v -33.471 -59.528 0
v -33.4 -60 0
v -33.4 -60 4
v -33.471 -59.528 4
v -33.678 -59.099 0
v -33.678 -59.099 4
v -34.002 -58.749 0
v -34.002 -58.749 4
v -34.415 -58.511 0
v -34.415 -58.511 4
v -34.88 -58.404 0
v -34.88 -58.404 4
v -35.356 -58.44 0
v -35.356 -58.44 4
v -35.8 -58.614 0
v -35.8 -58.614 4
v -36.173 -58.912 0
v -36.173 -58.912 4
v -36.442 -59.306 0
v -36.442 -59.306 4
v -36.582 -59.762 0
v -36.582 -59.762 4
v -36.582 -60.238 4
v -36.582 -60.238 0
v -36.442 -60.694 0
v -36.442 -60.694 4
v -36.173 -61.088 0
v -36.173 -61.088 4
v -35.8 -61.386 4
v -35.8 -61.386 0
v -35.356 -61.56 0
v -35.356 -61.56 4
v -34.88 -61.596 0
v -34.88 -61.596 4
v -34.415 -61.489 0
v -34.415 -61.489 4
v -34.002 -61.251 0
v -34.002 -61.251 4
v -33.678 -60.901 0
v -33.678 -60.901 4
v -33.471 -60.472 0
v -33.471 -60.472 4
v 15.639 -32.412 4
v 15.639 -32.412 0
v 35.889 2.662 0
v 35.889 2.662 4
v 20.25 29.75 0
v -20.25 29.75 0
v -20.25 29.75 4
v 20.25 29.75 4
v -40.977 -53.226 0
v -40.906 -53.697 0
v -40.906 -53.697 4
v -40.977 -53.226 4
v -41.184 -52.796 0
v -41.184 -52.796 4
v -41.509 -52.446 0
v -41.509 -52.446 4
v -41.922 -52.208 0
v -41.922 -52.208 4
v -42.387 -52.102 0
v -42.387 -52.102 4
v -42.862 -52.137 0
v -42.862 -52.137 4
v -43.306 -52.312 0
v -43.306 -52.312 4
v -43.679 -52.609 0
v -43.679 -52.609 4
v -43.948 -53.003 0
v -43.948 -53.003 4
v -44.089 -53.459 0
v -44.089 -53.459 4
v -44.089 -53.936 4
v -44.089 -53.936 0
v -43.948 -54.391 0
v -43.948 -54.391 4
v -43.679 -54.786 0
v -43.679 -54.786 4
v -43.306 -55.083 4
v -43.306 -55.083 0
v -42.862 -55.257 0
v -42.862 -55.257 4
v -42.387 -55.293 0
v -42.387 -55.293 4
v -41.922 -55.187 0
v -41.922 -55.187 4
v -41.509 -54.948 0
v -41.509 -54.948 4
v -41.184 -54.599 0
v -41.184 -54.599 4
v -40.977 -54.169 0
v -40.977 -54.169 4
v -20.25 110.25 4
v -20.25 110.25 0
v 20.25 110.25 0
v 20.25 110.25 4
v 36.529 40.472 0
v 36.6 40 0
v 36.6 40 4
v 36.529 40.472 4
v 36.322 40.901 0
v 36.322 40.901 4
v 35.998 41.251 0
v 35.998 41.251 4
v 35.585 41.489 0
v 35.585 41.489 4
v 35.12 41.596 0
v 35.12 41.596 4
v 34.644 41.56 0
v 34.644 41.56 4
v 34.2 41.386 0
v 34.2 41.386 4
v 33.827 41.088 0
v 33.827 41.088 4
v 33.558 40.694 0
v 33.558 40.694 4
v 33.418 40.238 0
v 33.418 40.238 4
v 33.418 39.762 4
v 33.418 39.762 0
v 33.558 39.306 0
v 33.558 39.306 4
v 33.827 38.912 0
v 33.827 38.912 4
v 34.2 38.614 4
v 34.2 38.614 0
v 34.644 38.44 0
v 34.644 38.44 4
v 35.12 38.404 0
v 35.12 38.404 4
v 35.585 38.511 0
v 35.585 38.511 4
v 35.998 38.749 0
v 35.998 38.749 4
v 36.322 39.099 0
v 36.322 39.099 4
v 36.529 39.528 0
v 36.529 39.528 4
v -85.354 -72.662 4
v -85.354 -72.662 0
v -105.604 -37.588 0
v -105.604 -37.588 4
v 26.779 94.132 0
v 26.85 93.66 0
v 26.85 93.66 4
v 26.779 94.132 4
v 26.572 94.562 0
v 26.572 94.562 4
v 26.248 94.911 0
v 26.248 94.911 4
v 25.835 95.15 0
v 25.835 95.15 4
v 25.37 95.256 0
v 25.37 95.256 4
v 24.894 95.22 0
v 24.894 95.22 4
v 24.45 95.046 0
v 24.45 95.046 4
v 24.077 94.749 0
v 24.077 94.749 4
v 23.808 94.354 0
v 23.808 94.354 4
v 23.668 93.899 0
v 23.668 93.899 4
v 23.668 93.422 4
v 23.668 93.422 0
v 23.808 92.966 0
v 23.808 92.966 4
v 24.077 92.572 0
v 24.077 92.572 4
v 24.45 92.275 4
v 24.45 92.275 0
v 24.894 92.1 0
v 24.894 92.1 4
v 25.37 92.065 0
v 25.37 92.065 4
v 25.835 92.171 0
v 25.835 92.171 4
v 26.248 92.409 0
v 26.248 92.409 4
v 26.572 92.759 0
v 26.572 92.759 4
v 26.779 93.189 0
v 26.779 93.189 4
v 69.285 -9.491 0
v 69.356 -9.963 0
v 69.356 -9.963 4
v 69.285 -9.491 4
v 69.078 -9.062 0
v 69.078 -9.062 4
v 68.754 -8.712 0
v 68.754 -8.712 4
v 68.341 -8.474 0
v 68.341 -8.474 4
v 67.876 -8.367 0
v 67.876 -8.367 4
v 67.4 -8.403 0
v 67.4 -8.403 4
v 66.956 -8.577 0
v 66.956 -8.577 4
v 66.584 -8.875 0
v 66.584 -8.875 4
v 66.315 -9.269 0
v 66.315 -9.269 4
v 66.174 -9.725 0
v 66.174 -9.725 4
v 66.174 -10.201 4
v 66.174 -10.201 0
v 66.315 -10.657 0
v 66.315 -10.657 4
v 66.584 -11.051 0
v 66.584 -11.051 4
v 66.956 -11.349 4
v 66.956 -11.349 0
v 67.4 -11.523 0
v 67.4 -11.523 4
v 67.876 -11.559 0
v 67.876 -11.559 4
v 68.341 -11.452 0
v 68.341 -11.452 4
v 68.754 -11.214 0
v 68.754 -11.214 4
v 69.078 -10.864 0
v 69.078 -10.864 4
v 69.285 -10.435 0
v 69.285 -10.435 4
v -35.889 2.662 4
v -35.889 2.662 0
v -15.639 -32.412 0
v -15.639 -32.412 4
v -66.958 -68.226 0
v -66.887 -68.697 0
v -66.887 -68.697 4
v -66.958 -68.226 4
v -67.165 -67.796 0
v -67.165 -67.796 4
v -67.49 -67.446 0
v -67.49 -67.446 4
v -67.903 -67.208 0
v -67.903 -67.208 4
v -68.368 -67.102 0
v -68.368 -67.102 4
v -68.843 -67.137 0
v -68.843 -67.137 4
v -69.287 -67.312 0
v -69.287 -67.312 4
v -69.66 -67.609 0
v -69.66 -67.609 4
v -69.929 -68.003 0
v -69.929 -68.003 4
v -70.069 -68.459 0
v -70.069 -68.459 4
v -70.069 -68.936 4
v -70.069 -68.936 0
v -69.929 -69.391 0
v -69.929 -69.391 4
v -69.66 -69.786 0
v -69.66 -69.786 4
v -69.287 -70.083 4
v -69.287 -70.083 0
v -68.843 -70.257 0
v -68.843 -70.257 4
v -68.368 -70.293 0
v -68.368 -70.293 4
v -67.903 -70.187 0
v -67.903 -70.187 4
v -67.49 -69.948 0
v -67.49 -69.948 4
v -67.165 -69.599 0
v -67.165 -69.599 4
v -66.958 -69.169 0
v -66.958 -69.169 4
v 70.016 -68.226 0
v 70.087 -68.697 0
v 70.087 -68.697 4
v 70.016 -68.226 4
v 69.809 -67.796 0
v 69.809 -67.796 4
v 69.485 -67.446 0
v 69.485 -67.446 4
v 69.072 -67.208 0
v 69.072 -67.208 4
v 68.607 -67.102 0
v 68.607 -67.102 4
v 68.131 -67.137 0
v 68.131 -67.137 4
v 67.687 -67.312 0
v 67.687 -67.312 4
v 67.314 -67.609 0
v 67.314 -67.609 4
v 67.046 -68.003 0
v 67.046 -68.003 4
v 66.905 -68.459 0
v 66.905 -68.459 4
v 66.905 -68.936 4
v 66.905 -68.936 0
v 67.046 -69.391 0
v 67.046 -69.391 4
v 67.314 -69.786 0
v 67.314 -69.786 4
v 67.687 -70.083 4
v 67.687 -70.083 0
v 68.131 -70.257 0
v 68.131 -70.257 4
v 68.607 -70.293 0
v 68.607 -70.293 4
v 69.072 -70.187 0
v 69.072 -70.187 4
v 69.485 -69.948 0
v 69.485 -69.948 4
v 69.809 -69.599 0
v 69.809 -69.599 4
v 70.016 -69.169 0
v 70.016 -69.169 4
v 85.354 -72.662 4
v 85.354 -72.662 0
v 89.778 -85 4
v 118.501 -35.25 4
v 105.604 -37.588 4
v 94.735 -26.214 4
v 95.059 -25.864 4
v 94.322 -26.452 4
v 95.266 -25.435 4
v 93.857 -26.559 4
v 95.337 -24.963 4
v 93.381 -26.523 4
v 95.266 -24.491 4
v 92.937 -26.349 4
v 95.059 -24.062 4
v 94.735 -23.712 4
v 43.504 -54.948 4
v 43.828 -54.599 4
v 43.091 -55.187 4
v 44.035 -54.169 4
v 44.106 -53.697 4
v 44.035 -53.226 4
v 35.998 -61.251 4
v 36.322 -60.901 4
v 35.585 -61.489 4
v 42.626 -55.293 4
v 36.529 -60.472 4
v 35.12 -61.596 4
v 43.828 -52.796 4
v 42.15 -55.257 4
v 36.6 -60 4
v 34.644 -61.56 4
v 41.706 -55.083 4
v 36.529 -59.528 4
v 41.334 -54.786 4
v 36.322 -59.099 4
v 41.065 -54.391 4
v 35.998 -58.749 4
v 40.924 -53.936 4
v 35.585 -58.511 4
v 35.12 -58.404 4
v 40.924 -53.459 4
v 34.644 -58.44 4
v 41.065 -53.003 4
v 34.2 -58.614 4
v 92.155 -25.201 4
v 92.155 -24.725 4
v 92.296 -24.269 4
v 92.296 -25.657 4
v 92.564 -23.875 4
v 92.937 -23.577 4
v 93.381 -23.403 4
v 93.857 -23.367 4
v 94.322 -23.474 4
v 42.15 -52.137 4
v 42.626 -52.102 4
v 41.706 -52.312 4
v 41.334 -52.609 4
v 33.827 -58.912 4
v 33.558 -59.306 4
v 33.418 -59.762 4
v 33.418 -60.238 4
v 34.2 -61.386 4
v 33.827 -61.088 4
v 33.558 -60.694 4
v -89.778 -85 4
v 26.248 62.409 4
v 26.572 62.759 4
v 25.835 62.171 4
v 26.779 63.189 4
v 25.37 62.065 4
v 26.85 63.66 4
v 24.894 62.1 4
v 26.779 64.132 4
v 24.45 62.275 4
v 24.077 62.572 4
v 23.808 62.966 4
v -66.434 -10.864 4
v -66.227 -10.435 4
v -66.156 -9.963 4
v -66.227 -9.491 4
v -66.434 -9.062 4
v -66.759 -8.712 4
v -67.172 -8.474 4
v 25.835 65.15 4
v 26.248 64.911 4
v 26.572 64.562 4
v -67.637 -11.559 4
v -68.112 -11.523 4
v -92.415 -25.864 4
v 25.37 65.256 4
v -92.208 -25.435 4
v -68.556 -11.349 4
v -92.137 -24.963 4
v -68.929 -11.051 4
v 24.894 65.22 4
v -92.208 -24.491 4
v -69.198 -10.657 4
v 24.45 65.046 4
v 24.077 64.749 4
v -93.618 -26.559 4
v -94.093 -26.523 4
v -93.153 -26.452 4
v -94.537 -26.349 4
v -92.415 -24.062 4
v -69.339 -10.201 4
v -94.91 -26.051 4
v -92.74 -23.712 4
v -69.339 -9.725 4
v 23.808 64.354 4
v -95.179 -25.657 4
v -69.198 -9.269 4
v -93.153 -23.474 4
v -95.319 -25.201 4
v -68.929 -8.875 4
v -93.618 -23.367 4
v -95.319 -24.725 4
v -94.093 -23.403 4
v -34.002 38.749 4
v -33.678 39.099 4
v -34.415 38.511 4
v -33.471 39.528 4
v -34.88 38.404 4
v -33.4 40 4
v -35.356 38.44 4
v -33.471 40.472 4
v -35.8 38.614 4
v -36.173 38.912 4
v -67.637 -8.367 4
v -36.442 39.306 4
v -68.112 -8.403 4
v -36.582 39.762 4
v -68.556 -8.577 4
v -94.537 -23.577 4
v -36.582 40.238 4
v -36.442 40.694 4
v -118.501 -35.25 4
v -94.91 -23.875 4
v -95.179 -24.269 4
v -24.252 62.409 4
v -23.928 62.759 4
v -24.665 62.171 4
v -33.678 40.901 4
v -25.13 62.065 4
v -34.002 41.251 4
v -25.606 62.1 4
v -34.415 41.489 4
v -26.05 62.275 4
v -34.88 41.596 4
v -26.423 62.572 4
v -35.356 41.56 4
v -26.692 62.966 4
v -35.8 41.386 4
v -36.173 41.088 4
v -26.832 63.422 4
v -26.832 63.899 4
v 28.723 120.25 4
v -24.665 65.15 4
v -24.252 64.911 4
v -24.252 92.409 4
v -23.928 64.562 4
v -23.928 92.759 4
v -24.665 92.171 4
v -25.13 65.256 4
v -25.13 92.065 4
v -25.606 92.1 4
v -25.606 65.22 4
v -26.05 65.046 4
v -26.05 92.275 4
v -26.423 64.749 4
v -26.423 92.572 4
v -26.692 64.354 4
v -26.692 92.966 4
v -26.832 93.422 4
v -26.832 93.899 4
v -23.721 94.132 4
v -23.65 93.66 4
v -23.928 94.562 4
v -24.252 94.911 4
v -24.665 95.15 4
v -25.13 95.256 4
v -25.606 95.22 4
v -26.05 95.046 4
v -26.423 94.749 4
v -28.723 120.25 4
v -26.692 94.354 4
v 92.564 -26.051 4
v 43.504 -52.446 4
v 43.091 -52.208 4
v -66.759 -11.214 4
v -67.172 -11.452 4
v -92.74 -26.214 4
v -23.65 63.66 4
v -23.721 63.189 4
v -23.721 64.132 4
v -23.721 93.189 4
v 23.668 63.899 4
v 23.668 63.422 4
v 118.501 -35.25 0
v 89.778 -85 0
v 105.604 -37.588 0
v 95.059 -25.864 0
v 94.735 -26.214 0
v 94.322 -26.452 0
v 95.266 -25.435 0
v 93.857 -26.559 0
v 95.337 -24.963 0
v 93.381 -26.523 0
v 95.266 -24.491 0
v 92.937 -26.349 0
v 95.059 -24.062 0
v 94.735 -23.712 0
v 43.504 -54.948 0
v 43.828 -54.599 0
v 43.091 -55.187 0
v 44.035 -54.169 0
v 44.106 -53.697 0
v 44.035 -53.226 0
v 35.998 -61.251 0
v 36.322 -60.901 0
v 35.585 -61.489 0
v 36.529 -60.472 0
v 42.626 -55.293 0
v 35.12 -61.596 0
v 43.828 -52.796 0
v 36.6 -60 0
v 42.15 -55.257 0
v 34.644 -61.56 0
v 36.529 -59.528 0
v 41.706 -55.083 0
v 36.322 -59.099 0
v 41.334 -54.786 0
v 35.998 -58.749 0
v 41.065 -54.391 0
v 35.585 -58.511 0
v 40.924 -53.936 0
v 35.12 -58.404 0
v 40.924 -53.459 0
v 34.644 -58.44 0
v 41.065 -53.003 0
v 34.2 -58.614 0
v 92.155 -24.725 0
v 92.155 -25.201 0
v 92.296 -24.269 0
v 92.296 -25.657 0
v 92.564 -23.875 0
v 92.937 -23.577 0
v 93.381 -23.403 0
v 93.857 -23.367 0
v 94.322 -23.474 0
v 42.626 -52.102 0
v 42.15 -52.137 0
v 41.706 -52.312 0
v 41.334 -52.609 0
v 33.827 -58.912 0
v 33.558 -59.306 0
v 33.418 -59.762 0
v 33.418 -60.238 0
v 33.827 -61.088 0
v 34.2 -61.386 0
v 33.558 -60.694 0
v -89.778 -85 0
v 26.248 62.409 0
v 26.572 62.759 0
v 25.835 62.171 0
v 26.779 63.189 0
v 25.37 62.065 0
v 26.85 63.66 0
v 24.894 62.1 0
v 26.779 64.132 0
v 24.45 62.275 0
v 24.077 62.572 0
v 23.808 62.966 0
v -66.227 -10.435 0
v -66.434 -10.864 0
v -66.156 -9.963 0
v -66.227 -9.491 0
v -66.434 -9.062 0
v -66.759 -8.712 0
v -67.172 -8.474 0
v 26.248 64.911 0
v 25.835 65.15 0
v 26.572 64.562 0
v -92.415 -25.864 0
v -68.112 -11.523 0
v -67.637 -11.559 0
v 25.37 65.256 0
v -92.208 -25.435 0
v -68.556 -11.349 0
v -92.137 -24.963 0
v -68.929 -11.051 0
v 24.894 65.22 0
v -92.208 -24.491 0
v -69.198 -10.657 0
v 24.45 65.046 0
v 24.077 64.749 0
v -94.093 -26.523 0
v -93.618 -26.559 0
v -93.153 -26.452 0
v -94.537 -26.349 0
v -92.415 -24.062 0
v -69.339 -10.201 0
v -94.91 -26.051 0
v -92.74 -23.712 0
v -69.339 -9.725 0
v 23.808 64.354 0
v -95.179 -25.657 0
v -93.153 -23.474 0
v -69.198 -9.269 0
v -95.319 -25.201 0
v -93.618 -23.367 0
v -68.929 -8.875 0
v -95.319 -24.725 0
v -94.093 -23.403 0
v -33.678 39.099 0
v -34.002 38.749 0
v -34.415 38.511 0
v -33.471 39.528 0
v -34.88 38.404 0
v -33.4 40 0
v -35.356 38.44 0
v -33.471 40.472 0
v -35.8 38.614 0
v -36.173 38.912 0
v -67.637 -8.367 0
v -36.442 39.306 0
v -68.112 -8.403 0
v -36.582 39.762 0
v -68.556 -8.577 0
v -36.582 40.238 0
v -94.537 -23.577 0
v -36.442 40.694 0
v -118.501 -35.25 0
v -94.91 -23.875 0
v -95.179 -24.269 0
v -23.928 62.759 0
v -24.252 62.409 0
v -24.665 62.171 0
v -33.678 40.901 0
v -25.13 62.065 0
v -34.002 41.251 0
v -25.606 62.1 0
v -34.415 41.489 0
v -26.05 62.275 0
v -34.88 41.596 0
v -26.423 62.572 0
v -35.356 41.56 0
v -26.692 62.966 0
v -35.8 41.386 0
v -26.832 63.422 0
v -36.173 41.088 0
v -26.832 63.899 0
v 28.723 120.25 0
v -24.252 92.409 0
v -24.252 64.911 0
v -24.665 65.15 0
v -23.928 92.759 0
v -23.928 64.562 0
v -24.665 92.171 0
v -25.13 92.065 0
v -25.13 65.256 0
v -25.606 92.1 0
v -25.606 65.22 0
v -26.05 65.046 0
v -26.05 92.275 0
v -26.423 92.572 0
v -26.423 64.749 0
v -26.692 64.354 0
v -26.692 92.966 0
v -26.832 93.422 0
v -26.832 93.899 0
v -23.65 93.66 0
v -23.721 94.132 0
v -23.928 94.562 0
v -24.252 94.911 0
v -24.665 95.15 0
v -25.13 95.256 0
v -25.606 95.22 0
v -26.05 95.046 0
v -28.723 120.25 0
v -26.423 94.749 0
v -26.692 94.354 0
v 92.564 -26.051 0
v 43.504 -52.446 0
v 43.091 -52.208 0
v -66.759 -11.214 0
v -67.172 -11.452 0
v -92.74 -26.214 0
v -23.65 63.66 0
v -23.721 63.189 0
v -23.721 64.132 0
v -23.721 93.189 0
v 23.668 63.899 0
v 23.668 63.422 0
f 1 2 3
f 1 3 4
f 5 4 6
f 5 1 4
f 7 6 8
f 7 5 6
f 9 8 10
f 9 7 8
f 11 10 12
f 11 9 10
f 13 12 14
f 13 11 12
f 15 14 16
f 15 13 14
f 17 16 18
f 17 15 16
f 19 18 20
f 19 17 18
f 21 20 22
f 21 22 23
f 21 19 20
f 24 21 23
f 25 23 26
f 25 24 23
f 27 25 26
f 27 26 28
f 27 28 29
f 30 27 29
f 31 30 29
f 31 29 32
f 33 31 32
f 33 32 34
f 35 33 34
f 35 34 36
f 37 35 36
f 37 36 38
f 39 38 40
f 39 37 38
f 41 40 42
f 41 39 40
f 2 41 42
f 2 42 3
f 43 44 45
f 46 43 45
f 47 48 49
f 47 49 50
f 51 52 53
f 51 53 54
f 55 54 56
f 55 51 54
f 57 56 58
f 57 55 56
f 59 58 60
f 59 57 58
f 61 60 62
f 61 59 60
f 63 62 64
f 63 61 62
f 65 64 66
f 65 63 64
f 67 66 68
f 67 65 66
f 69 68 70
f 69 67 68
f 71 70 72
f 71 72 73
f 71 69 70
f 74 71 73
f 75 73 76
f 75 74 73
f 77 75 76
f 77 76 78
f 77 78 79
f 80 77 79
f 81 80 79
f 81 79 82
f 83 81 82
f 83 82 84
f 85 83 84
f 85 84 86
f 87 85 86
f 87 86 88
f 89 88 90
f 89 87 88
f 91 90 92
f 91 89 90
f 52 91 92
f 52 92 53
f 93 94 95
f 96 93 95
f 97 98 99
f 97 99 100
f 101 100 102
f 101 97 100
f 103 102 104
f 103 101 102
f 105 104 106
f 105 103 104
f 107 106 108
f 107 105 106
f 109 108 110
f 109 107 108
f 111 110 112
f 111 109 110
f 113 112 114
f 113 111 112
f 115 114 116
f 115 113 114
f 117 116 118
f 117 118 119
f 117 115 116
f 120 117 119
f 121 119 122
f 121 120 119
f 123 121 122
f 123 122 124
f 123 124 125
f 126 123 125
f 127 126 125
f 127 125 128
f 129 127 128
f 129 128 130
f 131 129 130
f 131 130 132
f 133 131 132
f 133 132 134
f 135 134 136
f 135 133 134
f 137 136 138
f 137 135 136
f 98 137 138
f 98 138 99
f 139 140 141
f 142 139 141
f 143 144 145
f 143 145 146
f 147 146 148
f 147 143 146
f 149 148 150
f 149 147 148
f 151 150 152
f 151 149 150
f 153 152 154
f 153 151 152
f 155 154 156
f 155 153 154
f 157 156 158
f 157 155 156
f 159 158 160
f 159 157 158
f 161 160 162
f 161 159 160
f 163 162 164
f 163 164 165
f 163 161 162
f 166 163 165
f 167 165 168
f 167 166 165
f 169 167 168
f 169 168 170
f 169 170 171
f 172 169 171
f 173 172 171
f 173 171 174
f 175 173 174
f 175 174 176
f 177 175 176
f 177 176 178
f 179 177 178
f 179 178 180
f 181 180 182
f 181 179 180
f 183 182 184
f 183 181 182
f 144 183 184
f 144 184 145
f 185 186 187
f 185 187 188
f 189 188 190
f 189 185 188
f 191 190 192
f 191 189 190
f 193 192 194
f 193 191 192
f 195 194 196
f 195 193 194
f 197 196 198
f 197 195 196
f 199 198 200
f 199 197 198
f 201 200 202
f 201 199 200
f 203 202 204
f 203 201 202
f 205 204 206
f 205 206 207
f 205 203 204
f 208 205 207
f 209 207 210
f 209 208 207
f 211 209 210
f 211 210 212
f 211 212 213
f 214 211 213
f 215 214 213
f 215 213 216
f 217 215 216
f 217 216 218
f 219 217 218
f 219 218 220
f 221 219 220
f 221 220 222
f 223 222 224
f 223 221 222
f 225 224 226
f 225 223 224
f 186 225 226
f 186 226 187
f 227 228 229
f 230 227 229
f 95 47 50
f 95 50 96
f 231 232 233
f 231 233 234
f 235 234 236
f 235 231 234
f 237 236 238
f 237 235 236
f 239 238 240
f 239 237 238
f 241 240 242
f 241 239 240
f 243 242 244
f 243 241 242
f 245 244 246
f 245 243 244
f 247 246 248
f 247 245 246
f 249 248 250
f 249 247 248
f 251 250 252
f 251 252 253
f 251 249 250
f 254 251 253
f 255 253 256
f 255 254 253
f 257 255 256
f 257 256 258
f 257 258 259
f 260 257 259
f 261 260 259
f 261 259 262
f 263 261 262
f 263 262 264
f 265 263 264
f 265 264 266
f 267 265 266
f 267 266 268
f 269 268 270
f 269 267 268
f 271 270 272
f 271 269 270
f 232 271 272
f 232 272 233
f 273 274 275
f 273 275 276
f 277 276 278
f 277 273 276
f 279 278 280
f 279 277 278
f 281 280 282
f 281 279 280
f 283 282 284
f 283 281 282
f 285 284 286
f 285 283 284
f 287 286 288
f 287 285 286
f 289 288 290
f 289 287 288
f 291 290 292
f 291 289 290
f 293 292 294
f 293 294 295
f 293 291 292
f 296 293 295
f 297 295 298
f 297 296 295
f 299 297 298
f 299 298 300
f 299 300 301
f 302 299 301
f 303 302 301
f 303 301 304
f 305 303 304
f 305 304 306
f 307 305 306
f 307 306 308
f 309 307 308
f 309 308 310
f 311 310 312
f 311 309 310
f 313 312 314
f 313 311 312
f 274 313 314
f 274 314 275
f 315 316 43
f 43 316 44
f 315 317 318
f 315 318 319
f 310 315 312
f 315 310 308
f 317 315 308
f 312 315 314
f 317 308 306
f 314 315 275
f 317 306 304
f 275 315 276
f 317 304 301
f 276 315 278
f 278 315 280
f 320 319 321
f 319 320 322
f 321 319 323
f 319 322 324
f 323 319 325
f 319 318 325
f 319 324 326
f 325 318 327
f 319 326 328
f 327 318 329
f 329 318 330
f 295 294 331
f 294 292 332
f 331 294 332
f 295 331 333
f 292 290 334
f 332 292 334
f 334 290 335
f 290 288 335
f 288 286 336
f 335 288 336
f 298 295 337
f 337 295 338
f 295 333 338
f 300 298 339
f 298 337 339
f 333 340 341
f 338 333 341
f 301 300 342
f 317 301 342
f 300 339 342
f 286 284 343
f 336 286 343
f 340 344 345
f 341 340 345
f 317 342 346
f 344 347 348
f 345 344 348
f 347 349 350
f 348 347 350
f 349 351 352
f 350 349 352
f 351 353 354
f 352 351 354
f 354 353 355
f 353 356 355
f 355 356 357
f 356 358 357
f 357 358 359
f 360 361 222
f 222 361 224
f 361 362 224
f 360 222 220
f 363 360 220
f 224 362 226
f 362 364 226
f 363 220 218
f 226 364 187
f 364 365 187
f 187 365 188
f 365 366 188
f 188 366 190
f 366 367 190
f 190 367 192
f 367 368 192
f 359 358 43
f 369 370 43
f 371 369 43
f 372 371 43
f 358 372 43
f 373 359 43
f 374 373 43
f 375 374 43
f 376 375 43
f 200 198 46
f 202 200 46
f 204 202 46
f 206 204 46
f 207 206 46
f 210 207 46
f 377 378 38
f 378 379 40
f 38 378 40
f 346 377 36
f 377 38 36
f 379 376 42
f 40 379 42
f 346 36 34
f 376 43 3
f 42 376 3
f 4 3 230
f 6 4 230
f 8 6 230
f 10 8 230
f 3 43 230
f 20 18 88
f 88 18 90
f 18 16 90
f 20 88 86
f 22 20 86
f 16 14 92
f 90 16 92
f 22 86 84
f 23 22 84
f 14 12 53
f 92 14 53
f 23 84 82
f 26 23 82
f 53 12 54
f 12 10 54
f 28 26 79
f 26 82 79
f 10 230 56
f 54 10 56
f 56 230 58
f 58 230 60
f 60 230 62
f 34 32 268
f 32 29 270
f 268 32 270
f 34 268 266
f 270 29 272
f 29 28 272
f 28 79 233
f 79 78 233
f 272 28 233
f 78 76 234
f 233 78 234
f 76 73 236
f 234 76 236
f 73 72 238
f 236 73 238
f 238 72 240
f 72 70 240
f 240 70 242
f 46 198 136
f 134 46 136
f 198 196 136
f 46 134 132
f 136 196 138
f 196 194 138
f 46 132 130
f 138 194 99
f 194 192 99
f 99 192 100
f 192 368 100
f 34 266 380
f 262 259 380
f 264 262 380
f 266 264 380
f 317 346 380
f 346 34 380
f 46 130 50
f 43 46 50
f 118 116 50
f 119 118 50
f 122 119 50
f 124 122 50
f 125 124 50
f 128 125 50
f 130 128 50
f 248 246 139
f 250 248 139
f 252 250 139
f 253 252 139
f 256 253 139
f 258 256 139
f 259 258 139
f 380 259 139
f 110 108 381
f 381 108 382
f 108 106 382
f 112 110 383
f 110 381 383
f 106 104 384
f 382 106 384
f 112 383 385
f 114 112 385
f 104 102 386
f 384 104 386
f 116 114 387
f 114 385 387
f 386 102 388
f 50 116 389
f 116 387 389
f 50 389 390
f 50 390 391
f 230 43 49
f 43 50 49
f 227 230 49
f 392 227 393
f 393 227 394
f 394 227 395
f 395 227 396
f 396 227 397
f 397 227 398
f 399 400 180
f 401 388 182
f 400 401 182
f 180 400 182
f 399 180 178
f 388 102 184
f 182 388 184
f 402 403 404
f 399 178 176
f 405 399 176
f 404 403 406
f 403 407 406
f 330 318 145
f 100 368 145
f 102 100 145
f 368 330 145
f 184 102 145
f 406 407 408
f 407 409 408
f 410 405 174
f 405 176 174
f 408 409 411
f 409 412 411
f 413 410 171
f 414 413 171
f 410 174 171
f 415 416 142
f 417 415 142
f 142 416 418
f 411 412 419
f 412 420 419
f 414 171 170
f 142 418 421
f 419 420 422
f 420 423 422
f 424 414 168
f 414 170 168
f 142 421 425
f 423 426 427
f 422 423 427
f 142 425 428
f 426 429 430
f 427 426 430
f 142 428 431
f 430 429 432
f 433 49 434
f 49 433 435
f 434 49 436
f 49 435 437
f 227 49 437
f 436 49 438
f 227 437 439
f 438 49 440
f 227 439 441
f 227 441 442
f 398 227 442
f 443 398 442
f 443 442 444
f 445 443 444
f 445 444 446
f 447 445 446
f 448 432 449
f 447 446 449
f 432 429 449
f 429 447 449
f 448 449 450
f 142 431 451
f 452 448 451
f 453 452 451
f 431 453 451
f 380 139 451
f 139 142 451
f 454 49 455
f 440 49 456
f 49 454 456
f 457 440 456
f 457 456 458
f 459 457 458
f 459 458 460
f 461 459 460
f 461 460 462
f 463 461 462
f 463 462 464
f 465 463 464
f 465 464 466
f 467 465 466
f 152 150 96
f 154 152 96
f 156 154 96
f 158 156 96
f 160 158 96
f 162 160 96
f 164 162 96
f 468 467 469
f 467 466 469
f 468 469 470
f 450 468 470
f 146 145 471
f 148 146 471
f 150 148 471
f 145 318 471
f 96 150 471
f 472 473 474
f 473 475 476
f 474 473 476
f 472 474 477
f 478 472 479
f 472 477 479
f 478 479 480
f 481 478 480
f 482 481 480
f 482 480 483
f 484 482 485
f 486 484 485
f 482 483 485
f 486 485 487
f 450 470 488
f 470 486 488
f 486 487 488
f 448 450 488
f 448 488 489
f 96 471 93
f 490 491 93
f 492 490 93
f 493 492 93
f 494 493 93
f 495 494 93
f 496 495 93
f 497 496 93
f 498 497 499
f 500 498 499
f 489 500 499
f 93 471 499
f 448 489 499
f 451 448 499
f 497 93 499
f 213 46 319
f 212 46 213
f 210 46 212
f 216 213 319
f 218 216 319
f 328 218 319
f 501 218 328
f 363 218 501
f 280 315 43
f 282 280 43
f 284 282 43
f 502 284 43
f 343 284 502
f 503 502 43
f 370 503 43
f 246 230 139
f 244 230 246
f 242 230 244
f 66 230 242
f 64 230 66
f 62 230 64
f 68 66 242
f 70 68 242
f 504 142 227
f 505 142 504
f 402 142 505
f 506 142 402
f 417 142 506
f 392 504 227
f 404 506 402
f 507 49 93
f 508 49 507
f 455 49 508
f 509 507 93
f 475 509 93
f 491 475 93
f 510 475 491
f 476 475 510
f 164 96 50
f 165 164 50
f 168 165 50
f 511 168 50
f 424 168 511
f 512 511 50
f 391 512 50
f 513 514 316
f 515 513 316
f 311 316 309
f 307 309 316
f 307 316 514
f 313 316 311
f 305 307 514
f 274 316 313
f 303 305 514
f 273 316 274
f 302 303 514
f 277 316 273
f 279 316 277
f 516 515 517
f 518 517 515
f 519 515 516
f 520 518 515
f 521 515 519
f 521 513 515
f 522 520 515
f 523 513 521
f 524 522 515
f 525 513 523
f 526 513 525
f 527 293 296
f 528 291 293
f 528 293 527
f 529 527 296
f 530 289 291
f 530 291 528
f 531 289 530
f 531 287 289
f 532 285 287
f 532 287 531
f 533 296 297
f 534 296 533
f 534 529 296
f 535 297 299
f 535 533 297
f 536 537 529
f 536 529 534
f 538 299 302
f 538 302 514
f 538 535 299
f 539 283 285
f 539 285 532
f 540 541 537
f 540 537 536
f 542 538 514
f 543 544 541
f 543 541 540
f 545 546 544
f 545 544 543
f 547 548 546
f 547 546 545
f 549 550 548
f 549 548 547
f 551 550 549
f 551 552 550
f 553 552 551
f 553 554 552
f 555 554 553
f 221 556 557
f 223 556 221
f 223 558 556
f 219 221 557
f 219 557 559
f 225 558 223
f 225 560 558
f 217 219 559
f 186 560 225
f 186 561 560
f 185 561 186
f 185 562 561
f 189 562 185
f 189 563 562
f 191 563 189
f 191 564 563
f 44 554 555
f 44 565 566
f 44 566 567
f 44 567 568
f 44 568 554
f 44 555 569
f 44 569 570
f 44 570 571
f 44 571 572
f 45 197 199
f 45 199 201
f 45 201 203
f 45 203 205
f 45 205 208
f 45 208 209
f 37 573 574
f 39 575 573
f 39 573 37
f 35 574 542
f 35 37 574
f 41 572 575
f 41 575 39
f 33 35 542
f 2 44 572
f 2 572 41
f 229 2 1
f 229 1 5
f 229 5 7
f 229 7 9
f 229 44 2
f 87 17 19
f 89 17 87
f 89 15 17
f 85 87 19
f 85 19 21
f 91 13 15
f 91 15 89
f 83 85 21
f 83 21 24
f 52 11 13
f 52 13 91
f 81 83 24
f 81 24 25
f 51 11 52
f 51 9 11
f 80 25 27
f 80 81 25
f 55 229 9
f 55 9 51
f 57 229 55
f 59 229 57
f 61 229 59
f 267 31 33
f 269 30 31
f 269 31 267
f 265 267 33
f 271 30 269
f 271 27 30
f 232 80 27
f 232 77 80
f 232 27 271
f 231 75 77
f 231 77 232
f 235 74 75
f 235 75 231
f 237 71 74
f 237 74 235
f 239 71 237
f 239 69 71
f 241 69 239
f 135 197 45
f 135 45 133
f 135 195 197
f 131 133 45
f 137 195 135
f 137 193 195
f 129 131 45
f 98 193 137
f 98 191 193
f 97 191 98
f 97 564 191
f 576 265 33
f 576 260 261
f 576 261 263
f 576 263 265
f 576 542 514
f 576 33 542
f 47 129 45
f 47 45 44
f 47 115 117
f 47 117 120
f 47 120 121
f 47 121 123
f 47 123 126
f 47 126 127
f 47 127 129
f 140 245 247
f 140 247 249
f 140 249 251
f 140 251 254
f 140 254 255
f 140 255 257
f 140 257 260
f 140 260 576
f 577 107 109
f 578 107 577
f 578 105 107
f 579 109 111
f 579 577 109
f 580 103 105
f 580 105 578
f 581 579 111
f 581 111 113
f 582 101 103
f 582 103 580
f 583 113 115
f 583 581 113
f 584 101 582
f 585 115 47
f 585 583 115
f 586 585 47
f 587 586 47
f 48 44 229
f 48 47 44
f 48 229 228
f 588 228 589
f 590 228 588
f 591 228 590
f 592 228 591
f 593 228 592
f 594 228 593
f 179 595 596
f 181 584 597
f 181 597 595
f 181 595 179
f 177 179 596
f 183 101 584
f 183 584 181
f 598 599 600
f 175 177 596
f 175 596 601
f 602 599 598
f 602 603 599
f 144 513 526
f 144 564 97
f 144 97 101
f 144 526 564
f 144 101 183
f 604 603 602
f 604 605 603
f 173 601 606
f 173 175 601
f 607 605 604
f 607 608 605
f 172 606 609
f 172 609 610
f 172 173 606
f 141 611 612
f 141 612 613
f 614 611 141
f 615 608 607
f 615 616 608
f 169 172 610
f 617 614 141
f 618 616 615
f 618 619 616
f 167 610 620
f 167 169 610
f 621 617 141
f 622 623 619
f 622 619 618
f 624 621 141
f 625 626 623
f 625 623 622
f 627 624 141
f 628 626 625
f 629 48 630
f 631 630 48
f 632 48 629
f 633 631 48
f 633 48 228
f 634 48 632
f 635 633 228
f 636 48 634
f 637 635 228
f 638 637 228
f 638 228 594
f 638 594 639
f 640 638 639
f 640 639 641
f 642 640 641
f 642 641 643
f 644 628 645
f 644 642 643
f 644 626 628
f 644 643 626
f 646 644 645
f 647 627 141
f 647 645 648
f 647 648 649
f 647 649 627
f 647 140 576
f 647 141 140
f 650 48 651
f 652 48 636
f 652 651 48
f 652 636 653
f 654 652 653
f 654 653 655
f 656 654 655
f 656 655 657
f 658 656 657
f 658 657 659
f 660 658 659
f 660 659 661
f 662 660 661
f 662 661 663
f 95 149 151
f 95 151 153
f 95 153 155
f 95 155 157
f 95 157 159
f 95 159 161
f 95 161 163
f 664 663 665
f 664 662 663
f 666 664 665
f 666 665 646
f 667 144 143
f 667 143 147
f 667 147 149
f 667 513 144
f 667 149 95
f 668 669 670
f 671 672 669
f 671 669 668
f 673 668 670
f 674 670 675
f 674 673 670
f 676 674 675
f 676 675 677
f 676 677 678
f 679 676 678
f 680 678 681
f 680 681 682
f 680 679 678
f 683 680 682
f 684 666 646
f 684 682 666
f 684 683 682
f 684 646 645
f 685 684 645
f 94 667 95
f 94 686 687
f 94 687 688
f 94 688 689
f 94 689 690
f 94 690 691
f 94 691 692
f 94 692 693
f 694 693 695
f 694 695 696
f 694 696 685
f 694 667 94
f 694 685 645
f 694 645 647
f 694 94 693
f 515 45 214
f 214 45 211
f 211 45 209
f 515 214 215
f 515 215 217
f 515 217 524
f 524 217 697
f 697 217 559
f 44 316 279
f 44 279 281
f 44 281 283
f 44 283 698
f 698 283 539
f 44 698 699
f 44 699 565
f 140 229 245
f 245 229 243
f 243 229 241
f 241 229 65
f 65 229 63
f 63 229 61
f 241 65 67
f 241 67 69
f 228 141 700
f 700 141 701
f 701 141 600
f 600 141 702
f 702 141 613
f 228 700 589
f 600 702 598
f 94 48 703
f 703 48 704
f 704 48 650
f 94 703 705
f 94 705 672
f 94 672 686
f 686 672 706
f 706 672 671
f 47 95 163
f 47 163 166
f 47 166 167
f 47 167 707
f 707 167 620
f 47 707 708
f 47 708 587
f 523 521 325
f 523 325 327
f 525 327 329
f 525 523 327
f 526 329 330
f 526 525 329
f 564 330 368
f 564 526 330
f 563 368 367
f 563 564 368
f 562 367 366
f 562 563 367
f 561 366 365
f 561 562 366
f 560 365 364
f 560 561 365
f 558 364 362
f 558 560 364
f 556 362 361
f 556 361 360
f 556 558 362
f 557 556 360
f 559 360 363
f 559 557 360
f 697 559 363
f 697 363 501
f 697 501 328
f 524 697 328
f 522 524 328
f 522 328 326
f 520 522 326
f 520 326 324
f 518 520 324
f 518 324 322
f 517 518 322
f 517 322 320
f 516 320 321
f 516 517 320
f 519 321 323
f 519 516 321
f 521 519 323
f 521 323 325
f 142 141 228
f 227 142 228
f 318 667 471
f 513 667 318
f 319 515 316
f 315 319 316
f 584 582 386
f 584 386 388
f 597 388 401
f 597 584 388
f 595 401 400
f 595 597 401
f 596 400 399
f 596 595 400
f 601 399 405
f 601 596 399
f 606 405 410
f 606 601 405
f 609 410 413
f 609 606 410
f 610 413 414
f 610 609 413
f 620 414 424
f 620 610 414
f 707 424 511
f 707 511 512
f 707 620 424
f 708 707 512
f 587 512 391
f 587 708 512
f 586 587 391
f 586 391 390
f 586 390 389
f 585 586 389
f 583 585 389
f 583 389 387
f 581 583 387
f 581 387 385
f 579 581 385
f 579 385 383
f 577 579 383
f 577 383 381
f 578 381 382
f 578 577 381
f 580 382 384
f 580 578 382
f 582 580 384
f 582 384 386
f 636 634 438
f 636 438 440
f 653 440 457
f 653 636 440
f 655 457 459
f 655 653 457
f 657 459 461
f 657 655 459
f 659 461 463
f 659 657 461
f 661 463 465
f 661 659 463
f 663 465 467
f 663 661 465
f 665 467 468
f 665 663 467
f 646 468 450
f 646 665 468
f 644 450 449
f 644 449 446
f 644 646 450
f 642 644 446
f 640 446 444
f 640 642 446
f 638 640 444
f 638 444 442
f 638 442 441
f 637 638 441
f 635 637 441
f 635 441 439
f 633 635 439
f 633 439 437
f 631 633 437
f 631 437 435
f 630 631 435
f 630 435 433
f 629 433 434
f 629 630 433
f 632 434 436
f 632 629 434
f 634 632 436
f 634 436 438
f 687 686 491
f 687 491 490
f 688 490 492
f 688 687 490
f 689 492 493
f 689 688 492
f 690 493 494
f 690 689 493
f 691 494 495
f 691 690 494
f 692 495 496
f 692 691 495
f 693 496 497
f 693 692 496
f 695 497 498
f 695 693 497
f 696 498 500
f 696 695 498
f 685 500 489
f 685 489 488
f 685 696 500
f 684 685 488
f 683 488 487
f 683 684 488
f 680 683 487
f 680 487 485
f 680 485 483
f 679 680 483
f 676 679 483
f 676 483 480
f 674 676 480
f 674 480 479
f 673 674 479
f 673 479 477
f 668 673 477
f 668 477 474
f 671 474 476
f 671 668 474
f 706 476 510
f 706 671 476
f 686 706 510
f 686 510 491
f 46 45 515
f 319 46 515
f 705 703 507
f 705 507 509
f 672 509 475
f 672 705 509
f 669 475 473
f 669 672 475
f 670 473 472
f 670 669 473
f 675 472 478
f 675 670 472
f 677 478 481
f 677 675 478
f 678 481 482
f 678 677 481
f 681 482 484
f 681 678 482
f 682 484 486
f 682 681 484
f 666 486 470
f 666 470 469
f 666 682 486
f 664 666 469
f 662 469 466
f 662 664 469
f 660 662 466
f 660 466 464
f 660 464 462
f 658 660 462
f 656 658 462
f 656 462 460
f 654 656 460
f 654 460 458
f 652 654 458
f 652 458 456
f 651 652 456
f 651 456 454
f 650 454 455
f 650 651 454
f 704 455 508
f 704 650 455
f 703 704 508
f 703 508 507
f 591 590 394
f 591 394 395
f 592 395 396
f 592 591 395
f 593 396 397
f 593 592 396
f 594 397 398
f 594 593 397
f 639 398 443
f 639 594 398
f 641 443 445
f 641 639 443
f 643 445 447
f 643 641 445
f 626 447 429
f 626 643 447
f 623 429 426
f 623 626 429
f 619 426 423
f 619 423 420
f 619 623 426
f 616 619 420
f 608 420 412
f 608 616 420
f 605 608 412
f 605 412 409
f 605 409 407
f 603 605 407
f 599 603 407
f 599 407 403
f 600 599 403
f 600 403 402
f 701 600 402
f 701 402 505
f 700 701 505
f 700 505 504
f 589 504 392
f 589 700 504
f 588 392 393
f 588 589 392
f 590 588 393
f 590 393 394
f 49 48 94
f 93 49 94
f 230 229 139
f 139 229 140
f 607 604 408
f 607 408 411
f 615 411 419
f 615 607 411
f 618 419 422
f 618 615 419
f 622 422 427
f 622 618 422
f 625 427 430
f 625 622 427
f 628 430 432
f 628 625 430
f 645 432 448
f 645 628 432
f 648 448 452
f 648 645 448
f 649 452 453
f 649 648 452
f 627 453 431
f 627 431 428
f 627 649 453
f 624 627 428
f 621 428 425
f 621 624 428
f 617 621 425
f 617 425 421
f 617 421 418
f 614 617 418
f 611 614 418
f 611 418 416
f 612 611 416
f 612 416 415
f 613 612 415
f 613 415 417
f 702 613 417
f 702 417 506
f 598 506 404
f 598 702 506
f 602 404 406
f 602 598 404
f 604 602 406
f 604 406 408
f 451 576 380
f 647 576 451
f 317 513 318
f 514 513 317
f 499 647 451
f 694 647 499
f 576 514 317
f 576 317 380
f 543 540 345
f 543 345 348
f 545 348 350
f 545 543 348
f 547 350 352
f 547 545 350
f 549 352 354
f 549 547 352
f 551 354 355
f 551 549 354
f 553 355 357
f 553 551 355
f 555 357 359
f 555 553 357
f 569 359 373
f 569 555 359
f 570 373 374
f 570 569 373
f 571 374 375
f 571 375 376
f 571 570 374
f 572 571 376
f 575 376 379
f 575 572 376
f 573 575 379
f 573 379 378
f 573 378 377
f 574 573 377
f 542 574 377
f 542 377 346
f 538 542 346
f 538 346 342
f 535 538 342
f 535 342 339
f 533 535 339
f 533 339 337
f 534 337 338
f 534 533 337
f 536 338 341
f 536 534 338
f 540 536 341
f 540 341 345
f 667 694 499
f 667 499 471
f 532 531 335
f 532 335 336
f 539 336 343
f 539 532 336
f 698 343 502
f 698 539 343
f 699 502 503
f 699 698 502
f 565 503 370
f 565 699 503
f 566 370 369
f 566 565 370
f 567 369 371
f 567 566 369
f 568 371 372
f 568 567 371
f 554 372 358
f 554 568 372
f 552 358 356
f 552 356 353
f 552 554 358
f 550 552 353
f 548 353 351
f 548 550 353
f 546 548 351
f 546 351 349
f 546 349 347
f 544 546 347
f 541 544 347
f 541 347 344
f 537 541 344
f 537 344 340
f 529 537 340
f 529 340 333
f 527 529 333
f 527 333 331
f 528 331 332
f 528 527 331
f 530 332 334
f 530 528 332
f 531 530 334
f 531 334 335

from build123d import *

# Parameters (mm, degrees)
SKETCH_1_R      = 1.6
SKETCH_1_W      = 40.5
SKETCH_1_H      = 80.5
EXTRUDE_1_DEPTH = 4


with BuildPart() as part:
    # ｽｹｯﾁ1 → ﾎﾞｽ - 押し出し1 (new body)
    with BuildSketch(Plane.XY):
        Polygon((-28.723175892, 120.25), (28.723175892, 120.25), (118.501142751, -35.25), (89.777966859, -85), (-89.777966859, -85), (-118.501142751, -35.25), align=None)
        with Locations((25.25, 93.660254038)):
            Circle(SKETCH_1_R, mode=Mode.SUBTRACT)
        with Locations((25.25, 63.660254038)):
            Circle(SKETCH_1_R, mode=Mode.SUBTRACT)
        with Locations((-25.25, 63.660254038)):
            Circle(SKETCH_1_R, mode=Mode.SUBTRACT)
        with Locations((-25.25, 93.660254038)):
            Circle(SKETCH_1_R, mode=Mode.SUBTRACT)
        with Locations((68.487159322, -68.697268464)):
            Circle(SKETCH_1_R, mode=Mode.SUBTRACT)
        with Locations((93.737159322, -24.962985573)):
            Circle(SKETCH_1_R, mode=Mode.SUBTRACT)
        with Locations((67.756397208, -9.962985573)):
            Circle(SKETCH_1_R, mode=Mode.SUBTRACT)
        with Locations((42.506397208, -53.697268464)):
            Circle(SKETCH_1_R, mode=Mode.SUBTRACT)
        with Locations((-93.737159322, -24.962985573)):
            Circle(SKETCH_1_R, mode=Mode.SUBTRACT)
        with Locations((-68.487159322, -68.697268464)):
            Circle(SKETCH_1_R, mode=Mode.SUBTRACT)
        with Locations((-42.506397208, -53.697268464)):
            Circle(SKETCH_1_R, mode=Mode.SUBTRACT)
        with Locations((-67.756397208, -9.962985573)):
            Circle(SKETCH_1_R, mode=Mode.SUBTRACT)
        with Locations((-35, 40)):
            Circle(SKETCH_1_R, mode=Mode.SUBTRACT)
        with Locations((35, 40)):
            Circle(SKETCH_1_R, mode=Mode.SUBTRACT)
        with Locations((35, -60)):
            Circle(SKETCH_1_R, mode=Mode.SUBTRACT)
        with Locations((-35, -60)):
            Circle(SKETCH_1_R, mode=Mode.SUBTRACT)
        with Locations((0, 70)):
            Rectangle(SKETCH_1_W, SKETCH_1_H, mode=Mode.SUBTRACT)
        Polygon((105.604300767, -37.587985573), (85.354300767, -72.662014427), (15.639255763, -32.412014427), (35.889255763, 2.662014427), align=None, mode=Mode.SUBTRACT)
        Polygon((-85.354300767, -72.662014427), (-105.604300767, -37.587985573), (-35.889255763, 2.662014427), (-15.639255763, -32.412014427), align=None, mode=Mode.SUBTRACT)
    extrude(amount=EXTRUDE_1_DEPTH)


solid = part.part
